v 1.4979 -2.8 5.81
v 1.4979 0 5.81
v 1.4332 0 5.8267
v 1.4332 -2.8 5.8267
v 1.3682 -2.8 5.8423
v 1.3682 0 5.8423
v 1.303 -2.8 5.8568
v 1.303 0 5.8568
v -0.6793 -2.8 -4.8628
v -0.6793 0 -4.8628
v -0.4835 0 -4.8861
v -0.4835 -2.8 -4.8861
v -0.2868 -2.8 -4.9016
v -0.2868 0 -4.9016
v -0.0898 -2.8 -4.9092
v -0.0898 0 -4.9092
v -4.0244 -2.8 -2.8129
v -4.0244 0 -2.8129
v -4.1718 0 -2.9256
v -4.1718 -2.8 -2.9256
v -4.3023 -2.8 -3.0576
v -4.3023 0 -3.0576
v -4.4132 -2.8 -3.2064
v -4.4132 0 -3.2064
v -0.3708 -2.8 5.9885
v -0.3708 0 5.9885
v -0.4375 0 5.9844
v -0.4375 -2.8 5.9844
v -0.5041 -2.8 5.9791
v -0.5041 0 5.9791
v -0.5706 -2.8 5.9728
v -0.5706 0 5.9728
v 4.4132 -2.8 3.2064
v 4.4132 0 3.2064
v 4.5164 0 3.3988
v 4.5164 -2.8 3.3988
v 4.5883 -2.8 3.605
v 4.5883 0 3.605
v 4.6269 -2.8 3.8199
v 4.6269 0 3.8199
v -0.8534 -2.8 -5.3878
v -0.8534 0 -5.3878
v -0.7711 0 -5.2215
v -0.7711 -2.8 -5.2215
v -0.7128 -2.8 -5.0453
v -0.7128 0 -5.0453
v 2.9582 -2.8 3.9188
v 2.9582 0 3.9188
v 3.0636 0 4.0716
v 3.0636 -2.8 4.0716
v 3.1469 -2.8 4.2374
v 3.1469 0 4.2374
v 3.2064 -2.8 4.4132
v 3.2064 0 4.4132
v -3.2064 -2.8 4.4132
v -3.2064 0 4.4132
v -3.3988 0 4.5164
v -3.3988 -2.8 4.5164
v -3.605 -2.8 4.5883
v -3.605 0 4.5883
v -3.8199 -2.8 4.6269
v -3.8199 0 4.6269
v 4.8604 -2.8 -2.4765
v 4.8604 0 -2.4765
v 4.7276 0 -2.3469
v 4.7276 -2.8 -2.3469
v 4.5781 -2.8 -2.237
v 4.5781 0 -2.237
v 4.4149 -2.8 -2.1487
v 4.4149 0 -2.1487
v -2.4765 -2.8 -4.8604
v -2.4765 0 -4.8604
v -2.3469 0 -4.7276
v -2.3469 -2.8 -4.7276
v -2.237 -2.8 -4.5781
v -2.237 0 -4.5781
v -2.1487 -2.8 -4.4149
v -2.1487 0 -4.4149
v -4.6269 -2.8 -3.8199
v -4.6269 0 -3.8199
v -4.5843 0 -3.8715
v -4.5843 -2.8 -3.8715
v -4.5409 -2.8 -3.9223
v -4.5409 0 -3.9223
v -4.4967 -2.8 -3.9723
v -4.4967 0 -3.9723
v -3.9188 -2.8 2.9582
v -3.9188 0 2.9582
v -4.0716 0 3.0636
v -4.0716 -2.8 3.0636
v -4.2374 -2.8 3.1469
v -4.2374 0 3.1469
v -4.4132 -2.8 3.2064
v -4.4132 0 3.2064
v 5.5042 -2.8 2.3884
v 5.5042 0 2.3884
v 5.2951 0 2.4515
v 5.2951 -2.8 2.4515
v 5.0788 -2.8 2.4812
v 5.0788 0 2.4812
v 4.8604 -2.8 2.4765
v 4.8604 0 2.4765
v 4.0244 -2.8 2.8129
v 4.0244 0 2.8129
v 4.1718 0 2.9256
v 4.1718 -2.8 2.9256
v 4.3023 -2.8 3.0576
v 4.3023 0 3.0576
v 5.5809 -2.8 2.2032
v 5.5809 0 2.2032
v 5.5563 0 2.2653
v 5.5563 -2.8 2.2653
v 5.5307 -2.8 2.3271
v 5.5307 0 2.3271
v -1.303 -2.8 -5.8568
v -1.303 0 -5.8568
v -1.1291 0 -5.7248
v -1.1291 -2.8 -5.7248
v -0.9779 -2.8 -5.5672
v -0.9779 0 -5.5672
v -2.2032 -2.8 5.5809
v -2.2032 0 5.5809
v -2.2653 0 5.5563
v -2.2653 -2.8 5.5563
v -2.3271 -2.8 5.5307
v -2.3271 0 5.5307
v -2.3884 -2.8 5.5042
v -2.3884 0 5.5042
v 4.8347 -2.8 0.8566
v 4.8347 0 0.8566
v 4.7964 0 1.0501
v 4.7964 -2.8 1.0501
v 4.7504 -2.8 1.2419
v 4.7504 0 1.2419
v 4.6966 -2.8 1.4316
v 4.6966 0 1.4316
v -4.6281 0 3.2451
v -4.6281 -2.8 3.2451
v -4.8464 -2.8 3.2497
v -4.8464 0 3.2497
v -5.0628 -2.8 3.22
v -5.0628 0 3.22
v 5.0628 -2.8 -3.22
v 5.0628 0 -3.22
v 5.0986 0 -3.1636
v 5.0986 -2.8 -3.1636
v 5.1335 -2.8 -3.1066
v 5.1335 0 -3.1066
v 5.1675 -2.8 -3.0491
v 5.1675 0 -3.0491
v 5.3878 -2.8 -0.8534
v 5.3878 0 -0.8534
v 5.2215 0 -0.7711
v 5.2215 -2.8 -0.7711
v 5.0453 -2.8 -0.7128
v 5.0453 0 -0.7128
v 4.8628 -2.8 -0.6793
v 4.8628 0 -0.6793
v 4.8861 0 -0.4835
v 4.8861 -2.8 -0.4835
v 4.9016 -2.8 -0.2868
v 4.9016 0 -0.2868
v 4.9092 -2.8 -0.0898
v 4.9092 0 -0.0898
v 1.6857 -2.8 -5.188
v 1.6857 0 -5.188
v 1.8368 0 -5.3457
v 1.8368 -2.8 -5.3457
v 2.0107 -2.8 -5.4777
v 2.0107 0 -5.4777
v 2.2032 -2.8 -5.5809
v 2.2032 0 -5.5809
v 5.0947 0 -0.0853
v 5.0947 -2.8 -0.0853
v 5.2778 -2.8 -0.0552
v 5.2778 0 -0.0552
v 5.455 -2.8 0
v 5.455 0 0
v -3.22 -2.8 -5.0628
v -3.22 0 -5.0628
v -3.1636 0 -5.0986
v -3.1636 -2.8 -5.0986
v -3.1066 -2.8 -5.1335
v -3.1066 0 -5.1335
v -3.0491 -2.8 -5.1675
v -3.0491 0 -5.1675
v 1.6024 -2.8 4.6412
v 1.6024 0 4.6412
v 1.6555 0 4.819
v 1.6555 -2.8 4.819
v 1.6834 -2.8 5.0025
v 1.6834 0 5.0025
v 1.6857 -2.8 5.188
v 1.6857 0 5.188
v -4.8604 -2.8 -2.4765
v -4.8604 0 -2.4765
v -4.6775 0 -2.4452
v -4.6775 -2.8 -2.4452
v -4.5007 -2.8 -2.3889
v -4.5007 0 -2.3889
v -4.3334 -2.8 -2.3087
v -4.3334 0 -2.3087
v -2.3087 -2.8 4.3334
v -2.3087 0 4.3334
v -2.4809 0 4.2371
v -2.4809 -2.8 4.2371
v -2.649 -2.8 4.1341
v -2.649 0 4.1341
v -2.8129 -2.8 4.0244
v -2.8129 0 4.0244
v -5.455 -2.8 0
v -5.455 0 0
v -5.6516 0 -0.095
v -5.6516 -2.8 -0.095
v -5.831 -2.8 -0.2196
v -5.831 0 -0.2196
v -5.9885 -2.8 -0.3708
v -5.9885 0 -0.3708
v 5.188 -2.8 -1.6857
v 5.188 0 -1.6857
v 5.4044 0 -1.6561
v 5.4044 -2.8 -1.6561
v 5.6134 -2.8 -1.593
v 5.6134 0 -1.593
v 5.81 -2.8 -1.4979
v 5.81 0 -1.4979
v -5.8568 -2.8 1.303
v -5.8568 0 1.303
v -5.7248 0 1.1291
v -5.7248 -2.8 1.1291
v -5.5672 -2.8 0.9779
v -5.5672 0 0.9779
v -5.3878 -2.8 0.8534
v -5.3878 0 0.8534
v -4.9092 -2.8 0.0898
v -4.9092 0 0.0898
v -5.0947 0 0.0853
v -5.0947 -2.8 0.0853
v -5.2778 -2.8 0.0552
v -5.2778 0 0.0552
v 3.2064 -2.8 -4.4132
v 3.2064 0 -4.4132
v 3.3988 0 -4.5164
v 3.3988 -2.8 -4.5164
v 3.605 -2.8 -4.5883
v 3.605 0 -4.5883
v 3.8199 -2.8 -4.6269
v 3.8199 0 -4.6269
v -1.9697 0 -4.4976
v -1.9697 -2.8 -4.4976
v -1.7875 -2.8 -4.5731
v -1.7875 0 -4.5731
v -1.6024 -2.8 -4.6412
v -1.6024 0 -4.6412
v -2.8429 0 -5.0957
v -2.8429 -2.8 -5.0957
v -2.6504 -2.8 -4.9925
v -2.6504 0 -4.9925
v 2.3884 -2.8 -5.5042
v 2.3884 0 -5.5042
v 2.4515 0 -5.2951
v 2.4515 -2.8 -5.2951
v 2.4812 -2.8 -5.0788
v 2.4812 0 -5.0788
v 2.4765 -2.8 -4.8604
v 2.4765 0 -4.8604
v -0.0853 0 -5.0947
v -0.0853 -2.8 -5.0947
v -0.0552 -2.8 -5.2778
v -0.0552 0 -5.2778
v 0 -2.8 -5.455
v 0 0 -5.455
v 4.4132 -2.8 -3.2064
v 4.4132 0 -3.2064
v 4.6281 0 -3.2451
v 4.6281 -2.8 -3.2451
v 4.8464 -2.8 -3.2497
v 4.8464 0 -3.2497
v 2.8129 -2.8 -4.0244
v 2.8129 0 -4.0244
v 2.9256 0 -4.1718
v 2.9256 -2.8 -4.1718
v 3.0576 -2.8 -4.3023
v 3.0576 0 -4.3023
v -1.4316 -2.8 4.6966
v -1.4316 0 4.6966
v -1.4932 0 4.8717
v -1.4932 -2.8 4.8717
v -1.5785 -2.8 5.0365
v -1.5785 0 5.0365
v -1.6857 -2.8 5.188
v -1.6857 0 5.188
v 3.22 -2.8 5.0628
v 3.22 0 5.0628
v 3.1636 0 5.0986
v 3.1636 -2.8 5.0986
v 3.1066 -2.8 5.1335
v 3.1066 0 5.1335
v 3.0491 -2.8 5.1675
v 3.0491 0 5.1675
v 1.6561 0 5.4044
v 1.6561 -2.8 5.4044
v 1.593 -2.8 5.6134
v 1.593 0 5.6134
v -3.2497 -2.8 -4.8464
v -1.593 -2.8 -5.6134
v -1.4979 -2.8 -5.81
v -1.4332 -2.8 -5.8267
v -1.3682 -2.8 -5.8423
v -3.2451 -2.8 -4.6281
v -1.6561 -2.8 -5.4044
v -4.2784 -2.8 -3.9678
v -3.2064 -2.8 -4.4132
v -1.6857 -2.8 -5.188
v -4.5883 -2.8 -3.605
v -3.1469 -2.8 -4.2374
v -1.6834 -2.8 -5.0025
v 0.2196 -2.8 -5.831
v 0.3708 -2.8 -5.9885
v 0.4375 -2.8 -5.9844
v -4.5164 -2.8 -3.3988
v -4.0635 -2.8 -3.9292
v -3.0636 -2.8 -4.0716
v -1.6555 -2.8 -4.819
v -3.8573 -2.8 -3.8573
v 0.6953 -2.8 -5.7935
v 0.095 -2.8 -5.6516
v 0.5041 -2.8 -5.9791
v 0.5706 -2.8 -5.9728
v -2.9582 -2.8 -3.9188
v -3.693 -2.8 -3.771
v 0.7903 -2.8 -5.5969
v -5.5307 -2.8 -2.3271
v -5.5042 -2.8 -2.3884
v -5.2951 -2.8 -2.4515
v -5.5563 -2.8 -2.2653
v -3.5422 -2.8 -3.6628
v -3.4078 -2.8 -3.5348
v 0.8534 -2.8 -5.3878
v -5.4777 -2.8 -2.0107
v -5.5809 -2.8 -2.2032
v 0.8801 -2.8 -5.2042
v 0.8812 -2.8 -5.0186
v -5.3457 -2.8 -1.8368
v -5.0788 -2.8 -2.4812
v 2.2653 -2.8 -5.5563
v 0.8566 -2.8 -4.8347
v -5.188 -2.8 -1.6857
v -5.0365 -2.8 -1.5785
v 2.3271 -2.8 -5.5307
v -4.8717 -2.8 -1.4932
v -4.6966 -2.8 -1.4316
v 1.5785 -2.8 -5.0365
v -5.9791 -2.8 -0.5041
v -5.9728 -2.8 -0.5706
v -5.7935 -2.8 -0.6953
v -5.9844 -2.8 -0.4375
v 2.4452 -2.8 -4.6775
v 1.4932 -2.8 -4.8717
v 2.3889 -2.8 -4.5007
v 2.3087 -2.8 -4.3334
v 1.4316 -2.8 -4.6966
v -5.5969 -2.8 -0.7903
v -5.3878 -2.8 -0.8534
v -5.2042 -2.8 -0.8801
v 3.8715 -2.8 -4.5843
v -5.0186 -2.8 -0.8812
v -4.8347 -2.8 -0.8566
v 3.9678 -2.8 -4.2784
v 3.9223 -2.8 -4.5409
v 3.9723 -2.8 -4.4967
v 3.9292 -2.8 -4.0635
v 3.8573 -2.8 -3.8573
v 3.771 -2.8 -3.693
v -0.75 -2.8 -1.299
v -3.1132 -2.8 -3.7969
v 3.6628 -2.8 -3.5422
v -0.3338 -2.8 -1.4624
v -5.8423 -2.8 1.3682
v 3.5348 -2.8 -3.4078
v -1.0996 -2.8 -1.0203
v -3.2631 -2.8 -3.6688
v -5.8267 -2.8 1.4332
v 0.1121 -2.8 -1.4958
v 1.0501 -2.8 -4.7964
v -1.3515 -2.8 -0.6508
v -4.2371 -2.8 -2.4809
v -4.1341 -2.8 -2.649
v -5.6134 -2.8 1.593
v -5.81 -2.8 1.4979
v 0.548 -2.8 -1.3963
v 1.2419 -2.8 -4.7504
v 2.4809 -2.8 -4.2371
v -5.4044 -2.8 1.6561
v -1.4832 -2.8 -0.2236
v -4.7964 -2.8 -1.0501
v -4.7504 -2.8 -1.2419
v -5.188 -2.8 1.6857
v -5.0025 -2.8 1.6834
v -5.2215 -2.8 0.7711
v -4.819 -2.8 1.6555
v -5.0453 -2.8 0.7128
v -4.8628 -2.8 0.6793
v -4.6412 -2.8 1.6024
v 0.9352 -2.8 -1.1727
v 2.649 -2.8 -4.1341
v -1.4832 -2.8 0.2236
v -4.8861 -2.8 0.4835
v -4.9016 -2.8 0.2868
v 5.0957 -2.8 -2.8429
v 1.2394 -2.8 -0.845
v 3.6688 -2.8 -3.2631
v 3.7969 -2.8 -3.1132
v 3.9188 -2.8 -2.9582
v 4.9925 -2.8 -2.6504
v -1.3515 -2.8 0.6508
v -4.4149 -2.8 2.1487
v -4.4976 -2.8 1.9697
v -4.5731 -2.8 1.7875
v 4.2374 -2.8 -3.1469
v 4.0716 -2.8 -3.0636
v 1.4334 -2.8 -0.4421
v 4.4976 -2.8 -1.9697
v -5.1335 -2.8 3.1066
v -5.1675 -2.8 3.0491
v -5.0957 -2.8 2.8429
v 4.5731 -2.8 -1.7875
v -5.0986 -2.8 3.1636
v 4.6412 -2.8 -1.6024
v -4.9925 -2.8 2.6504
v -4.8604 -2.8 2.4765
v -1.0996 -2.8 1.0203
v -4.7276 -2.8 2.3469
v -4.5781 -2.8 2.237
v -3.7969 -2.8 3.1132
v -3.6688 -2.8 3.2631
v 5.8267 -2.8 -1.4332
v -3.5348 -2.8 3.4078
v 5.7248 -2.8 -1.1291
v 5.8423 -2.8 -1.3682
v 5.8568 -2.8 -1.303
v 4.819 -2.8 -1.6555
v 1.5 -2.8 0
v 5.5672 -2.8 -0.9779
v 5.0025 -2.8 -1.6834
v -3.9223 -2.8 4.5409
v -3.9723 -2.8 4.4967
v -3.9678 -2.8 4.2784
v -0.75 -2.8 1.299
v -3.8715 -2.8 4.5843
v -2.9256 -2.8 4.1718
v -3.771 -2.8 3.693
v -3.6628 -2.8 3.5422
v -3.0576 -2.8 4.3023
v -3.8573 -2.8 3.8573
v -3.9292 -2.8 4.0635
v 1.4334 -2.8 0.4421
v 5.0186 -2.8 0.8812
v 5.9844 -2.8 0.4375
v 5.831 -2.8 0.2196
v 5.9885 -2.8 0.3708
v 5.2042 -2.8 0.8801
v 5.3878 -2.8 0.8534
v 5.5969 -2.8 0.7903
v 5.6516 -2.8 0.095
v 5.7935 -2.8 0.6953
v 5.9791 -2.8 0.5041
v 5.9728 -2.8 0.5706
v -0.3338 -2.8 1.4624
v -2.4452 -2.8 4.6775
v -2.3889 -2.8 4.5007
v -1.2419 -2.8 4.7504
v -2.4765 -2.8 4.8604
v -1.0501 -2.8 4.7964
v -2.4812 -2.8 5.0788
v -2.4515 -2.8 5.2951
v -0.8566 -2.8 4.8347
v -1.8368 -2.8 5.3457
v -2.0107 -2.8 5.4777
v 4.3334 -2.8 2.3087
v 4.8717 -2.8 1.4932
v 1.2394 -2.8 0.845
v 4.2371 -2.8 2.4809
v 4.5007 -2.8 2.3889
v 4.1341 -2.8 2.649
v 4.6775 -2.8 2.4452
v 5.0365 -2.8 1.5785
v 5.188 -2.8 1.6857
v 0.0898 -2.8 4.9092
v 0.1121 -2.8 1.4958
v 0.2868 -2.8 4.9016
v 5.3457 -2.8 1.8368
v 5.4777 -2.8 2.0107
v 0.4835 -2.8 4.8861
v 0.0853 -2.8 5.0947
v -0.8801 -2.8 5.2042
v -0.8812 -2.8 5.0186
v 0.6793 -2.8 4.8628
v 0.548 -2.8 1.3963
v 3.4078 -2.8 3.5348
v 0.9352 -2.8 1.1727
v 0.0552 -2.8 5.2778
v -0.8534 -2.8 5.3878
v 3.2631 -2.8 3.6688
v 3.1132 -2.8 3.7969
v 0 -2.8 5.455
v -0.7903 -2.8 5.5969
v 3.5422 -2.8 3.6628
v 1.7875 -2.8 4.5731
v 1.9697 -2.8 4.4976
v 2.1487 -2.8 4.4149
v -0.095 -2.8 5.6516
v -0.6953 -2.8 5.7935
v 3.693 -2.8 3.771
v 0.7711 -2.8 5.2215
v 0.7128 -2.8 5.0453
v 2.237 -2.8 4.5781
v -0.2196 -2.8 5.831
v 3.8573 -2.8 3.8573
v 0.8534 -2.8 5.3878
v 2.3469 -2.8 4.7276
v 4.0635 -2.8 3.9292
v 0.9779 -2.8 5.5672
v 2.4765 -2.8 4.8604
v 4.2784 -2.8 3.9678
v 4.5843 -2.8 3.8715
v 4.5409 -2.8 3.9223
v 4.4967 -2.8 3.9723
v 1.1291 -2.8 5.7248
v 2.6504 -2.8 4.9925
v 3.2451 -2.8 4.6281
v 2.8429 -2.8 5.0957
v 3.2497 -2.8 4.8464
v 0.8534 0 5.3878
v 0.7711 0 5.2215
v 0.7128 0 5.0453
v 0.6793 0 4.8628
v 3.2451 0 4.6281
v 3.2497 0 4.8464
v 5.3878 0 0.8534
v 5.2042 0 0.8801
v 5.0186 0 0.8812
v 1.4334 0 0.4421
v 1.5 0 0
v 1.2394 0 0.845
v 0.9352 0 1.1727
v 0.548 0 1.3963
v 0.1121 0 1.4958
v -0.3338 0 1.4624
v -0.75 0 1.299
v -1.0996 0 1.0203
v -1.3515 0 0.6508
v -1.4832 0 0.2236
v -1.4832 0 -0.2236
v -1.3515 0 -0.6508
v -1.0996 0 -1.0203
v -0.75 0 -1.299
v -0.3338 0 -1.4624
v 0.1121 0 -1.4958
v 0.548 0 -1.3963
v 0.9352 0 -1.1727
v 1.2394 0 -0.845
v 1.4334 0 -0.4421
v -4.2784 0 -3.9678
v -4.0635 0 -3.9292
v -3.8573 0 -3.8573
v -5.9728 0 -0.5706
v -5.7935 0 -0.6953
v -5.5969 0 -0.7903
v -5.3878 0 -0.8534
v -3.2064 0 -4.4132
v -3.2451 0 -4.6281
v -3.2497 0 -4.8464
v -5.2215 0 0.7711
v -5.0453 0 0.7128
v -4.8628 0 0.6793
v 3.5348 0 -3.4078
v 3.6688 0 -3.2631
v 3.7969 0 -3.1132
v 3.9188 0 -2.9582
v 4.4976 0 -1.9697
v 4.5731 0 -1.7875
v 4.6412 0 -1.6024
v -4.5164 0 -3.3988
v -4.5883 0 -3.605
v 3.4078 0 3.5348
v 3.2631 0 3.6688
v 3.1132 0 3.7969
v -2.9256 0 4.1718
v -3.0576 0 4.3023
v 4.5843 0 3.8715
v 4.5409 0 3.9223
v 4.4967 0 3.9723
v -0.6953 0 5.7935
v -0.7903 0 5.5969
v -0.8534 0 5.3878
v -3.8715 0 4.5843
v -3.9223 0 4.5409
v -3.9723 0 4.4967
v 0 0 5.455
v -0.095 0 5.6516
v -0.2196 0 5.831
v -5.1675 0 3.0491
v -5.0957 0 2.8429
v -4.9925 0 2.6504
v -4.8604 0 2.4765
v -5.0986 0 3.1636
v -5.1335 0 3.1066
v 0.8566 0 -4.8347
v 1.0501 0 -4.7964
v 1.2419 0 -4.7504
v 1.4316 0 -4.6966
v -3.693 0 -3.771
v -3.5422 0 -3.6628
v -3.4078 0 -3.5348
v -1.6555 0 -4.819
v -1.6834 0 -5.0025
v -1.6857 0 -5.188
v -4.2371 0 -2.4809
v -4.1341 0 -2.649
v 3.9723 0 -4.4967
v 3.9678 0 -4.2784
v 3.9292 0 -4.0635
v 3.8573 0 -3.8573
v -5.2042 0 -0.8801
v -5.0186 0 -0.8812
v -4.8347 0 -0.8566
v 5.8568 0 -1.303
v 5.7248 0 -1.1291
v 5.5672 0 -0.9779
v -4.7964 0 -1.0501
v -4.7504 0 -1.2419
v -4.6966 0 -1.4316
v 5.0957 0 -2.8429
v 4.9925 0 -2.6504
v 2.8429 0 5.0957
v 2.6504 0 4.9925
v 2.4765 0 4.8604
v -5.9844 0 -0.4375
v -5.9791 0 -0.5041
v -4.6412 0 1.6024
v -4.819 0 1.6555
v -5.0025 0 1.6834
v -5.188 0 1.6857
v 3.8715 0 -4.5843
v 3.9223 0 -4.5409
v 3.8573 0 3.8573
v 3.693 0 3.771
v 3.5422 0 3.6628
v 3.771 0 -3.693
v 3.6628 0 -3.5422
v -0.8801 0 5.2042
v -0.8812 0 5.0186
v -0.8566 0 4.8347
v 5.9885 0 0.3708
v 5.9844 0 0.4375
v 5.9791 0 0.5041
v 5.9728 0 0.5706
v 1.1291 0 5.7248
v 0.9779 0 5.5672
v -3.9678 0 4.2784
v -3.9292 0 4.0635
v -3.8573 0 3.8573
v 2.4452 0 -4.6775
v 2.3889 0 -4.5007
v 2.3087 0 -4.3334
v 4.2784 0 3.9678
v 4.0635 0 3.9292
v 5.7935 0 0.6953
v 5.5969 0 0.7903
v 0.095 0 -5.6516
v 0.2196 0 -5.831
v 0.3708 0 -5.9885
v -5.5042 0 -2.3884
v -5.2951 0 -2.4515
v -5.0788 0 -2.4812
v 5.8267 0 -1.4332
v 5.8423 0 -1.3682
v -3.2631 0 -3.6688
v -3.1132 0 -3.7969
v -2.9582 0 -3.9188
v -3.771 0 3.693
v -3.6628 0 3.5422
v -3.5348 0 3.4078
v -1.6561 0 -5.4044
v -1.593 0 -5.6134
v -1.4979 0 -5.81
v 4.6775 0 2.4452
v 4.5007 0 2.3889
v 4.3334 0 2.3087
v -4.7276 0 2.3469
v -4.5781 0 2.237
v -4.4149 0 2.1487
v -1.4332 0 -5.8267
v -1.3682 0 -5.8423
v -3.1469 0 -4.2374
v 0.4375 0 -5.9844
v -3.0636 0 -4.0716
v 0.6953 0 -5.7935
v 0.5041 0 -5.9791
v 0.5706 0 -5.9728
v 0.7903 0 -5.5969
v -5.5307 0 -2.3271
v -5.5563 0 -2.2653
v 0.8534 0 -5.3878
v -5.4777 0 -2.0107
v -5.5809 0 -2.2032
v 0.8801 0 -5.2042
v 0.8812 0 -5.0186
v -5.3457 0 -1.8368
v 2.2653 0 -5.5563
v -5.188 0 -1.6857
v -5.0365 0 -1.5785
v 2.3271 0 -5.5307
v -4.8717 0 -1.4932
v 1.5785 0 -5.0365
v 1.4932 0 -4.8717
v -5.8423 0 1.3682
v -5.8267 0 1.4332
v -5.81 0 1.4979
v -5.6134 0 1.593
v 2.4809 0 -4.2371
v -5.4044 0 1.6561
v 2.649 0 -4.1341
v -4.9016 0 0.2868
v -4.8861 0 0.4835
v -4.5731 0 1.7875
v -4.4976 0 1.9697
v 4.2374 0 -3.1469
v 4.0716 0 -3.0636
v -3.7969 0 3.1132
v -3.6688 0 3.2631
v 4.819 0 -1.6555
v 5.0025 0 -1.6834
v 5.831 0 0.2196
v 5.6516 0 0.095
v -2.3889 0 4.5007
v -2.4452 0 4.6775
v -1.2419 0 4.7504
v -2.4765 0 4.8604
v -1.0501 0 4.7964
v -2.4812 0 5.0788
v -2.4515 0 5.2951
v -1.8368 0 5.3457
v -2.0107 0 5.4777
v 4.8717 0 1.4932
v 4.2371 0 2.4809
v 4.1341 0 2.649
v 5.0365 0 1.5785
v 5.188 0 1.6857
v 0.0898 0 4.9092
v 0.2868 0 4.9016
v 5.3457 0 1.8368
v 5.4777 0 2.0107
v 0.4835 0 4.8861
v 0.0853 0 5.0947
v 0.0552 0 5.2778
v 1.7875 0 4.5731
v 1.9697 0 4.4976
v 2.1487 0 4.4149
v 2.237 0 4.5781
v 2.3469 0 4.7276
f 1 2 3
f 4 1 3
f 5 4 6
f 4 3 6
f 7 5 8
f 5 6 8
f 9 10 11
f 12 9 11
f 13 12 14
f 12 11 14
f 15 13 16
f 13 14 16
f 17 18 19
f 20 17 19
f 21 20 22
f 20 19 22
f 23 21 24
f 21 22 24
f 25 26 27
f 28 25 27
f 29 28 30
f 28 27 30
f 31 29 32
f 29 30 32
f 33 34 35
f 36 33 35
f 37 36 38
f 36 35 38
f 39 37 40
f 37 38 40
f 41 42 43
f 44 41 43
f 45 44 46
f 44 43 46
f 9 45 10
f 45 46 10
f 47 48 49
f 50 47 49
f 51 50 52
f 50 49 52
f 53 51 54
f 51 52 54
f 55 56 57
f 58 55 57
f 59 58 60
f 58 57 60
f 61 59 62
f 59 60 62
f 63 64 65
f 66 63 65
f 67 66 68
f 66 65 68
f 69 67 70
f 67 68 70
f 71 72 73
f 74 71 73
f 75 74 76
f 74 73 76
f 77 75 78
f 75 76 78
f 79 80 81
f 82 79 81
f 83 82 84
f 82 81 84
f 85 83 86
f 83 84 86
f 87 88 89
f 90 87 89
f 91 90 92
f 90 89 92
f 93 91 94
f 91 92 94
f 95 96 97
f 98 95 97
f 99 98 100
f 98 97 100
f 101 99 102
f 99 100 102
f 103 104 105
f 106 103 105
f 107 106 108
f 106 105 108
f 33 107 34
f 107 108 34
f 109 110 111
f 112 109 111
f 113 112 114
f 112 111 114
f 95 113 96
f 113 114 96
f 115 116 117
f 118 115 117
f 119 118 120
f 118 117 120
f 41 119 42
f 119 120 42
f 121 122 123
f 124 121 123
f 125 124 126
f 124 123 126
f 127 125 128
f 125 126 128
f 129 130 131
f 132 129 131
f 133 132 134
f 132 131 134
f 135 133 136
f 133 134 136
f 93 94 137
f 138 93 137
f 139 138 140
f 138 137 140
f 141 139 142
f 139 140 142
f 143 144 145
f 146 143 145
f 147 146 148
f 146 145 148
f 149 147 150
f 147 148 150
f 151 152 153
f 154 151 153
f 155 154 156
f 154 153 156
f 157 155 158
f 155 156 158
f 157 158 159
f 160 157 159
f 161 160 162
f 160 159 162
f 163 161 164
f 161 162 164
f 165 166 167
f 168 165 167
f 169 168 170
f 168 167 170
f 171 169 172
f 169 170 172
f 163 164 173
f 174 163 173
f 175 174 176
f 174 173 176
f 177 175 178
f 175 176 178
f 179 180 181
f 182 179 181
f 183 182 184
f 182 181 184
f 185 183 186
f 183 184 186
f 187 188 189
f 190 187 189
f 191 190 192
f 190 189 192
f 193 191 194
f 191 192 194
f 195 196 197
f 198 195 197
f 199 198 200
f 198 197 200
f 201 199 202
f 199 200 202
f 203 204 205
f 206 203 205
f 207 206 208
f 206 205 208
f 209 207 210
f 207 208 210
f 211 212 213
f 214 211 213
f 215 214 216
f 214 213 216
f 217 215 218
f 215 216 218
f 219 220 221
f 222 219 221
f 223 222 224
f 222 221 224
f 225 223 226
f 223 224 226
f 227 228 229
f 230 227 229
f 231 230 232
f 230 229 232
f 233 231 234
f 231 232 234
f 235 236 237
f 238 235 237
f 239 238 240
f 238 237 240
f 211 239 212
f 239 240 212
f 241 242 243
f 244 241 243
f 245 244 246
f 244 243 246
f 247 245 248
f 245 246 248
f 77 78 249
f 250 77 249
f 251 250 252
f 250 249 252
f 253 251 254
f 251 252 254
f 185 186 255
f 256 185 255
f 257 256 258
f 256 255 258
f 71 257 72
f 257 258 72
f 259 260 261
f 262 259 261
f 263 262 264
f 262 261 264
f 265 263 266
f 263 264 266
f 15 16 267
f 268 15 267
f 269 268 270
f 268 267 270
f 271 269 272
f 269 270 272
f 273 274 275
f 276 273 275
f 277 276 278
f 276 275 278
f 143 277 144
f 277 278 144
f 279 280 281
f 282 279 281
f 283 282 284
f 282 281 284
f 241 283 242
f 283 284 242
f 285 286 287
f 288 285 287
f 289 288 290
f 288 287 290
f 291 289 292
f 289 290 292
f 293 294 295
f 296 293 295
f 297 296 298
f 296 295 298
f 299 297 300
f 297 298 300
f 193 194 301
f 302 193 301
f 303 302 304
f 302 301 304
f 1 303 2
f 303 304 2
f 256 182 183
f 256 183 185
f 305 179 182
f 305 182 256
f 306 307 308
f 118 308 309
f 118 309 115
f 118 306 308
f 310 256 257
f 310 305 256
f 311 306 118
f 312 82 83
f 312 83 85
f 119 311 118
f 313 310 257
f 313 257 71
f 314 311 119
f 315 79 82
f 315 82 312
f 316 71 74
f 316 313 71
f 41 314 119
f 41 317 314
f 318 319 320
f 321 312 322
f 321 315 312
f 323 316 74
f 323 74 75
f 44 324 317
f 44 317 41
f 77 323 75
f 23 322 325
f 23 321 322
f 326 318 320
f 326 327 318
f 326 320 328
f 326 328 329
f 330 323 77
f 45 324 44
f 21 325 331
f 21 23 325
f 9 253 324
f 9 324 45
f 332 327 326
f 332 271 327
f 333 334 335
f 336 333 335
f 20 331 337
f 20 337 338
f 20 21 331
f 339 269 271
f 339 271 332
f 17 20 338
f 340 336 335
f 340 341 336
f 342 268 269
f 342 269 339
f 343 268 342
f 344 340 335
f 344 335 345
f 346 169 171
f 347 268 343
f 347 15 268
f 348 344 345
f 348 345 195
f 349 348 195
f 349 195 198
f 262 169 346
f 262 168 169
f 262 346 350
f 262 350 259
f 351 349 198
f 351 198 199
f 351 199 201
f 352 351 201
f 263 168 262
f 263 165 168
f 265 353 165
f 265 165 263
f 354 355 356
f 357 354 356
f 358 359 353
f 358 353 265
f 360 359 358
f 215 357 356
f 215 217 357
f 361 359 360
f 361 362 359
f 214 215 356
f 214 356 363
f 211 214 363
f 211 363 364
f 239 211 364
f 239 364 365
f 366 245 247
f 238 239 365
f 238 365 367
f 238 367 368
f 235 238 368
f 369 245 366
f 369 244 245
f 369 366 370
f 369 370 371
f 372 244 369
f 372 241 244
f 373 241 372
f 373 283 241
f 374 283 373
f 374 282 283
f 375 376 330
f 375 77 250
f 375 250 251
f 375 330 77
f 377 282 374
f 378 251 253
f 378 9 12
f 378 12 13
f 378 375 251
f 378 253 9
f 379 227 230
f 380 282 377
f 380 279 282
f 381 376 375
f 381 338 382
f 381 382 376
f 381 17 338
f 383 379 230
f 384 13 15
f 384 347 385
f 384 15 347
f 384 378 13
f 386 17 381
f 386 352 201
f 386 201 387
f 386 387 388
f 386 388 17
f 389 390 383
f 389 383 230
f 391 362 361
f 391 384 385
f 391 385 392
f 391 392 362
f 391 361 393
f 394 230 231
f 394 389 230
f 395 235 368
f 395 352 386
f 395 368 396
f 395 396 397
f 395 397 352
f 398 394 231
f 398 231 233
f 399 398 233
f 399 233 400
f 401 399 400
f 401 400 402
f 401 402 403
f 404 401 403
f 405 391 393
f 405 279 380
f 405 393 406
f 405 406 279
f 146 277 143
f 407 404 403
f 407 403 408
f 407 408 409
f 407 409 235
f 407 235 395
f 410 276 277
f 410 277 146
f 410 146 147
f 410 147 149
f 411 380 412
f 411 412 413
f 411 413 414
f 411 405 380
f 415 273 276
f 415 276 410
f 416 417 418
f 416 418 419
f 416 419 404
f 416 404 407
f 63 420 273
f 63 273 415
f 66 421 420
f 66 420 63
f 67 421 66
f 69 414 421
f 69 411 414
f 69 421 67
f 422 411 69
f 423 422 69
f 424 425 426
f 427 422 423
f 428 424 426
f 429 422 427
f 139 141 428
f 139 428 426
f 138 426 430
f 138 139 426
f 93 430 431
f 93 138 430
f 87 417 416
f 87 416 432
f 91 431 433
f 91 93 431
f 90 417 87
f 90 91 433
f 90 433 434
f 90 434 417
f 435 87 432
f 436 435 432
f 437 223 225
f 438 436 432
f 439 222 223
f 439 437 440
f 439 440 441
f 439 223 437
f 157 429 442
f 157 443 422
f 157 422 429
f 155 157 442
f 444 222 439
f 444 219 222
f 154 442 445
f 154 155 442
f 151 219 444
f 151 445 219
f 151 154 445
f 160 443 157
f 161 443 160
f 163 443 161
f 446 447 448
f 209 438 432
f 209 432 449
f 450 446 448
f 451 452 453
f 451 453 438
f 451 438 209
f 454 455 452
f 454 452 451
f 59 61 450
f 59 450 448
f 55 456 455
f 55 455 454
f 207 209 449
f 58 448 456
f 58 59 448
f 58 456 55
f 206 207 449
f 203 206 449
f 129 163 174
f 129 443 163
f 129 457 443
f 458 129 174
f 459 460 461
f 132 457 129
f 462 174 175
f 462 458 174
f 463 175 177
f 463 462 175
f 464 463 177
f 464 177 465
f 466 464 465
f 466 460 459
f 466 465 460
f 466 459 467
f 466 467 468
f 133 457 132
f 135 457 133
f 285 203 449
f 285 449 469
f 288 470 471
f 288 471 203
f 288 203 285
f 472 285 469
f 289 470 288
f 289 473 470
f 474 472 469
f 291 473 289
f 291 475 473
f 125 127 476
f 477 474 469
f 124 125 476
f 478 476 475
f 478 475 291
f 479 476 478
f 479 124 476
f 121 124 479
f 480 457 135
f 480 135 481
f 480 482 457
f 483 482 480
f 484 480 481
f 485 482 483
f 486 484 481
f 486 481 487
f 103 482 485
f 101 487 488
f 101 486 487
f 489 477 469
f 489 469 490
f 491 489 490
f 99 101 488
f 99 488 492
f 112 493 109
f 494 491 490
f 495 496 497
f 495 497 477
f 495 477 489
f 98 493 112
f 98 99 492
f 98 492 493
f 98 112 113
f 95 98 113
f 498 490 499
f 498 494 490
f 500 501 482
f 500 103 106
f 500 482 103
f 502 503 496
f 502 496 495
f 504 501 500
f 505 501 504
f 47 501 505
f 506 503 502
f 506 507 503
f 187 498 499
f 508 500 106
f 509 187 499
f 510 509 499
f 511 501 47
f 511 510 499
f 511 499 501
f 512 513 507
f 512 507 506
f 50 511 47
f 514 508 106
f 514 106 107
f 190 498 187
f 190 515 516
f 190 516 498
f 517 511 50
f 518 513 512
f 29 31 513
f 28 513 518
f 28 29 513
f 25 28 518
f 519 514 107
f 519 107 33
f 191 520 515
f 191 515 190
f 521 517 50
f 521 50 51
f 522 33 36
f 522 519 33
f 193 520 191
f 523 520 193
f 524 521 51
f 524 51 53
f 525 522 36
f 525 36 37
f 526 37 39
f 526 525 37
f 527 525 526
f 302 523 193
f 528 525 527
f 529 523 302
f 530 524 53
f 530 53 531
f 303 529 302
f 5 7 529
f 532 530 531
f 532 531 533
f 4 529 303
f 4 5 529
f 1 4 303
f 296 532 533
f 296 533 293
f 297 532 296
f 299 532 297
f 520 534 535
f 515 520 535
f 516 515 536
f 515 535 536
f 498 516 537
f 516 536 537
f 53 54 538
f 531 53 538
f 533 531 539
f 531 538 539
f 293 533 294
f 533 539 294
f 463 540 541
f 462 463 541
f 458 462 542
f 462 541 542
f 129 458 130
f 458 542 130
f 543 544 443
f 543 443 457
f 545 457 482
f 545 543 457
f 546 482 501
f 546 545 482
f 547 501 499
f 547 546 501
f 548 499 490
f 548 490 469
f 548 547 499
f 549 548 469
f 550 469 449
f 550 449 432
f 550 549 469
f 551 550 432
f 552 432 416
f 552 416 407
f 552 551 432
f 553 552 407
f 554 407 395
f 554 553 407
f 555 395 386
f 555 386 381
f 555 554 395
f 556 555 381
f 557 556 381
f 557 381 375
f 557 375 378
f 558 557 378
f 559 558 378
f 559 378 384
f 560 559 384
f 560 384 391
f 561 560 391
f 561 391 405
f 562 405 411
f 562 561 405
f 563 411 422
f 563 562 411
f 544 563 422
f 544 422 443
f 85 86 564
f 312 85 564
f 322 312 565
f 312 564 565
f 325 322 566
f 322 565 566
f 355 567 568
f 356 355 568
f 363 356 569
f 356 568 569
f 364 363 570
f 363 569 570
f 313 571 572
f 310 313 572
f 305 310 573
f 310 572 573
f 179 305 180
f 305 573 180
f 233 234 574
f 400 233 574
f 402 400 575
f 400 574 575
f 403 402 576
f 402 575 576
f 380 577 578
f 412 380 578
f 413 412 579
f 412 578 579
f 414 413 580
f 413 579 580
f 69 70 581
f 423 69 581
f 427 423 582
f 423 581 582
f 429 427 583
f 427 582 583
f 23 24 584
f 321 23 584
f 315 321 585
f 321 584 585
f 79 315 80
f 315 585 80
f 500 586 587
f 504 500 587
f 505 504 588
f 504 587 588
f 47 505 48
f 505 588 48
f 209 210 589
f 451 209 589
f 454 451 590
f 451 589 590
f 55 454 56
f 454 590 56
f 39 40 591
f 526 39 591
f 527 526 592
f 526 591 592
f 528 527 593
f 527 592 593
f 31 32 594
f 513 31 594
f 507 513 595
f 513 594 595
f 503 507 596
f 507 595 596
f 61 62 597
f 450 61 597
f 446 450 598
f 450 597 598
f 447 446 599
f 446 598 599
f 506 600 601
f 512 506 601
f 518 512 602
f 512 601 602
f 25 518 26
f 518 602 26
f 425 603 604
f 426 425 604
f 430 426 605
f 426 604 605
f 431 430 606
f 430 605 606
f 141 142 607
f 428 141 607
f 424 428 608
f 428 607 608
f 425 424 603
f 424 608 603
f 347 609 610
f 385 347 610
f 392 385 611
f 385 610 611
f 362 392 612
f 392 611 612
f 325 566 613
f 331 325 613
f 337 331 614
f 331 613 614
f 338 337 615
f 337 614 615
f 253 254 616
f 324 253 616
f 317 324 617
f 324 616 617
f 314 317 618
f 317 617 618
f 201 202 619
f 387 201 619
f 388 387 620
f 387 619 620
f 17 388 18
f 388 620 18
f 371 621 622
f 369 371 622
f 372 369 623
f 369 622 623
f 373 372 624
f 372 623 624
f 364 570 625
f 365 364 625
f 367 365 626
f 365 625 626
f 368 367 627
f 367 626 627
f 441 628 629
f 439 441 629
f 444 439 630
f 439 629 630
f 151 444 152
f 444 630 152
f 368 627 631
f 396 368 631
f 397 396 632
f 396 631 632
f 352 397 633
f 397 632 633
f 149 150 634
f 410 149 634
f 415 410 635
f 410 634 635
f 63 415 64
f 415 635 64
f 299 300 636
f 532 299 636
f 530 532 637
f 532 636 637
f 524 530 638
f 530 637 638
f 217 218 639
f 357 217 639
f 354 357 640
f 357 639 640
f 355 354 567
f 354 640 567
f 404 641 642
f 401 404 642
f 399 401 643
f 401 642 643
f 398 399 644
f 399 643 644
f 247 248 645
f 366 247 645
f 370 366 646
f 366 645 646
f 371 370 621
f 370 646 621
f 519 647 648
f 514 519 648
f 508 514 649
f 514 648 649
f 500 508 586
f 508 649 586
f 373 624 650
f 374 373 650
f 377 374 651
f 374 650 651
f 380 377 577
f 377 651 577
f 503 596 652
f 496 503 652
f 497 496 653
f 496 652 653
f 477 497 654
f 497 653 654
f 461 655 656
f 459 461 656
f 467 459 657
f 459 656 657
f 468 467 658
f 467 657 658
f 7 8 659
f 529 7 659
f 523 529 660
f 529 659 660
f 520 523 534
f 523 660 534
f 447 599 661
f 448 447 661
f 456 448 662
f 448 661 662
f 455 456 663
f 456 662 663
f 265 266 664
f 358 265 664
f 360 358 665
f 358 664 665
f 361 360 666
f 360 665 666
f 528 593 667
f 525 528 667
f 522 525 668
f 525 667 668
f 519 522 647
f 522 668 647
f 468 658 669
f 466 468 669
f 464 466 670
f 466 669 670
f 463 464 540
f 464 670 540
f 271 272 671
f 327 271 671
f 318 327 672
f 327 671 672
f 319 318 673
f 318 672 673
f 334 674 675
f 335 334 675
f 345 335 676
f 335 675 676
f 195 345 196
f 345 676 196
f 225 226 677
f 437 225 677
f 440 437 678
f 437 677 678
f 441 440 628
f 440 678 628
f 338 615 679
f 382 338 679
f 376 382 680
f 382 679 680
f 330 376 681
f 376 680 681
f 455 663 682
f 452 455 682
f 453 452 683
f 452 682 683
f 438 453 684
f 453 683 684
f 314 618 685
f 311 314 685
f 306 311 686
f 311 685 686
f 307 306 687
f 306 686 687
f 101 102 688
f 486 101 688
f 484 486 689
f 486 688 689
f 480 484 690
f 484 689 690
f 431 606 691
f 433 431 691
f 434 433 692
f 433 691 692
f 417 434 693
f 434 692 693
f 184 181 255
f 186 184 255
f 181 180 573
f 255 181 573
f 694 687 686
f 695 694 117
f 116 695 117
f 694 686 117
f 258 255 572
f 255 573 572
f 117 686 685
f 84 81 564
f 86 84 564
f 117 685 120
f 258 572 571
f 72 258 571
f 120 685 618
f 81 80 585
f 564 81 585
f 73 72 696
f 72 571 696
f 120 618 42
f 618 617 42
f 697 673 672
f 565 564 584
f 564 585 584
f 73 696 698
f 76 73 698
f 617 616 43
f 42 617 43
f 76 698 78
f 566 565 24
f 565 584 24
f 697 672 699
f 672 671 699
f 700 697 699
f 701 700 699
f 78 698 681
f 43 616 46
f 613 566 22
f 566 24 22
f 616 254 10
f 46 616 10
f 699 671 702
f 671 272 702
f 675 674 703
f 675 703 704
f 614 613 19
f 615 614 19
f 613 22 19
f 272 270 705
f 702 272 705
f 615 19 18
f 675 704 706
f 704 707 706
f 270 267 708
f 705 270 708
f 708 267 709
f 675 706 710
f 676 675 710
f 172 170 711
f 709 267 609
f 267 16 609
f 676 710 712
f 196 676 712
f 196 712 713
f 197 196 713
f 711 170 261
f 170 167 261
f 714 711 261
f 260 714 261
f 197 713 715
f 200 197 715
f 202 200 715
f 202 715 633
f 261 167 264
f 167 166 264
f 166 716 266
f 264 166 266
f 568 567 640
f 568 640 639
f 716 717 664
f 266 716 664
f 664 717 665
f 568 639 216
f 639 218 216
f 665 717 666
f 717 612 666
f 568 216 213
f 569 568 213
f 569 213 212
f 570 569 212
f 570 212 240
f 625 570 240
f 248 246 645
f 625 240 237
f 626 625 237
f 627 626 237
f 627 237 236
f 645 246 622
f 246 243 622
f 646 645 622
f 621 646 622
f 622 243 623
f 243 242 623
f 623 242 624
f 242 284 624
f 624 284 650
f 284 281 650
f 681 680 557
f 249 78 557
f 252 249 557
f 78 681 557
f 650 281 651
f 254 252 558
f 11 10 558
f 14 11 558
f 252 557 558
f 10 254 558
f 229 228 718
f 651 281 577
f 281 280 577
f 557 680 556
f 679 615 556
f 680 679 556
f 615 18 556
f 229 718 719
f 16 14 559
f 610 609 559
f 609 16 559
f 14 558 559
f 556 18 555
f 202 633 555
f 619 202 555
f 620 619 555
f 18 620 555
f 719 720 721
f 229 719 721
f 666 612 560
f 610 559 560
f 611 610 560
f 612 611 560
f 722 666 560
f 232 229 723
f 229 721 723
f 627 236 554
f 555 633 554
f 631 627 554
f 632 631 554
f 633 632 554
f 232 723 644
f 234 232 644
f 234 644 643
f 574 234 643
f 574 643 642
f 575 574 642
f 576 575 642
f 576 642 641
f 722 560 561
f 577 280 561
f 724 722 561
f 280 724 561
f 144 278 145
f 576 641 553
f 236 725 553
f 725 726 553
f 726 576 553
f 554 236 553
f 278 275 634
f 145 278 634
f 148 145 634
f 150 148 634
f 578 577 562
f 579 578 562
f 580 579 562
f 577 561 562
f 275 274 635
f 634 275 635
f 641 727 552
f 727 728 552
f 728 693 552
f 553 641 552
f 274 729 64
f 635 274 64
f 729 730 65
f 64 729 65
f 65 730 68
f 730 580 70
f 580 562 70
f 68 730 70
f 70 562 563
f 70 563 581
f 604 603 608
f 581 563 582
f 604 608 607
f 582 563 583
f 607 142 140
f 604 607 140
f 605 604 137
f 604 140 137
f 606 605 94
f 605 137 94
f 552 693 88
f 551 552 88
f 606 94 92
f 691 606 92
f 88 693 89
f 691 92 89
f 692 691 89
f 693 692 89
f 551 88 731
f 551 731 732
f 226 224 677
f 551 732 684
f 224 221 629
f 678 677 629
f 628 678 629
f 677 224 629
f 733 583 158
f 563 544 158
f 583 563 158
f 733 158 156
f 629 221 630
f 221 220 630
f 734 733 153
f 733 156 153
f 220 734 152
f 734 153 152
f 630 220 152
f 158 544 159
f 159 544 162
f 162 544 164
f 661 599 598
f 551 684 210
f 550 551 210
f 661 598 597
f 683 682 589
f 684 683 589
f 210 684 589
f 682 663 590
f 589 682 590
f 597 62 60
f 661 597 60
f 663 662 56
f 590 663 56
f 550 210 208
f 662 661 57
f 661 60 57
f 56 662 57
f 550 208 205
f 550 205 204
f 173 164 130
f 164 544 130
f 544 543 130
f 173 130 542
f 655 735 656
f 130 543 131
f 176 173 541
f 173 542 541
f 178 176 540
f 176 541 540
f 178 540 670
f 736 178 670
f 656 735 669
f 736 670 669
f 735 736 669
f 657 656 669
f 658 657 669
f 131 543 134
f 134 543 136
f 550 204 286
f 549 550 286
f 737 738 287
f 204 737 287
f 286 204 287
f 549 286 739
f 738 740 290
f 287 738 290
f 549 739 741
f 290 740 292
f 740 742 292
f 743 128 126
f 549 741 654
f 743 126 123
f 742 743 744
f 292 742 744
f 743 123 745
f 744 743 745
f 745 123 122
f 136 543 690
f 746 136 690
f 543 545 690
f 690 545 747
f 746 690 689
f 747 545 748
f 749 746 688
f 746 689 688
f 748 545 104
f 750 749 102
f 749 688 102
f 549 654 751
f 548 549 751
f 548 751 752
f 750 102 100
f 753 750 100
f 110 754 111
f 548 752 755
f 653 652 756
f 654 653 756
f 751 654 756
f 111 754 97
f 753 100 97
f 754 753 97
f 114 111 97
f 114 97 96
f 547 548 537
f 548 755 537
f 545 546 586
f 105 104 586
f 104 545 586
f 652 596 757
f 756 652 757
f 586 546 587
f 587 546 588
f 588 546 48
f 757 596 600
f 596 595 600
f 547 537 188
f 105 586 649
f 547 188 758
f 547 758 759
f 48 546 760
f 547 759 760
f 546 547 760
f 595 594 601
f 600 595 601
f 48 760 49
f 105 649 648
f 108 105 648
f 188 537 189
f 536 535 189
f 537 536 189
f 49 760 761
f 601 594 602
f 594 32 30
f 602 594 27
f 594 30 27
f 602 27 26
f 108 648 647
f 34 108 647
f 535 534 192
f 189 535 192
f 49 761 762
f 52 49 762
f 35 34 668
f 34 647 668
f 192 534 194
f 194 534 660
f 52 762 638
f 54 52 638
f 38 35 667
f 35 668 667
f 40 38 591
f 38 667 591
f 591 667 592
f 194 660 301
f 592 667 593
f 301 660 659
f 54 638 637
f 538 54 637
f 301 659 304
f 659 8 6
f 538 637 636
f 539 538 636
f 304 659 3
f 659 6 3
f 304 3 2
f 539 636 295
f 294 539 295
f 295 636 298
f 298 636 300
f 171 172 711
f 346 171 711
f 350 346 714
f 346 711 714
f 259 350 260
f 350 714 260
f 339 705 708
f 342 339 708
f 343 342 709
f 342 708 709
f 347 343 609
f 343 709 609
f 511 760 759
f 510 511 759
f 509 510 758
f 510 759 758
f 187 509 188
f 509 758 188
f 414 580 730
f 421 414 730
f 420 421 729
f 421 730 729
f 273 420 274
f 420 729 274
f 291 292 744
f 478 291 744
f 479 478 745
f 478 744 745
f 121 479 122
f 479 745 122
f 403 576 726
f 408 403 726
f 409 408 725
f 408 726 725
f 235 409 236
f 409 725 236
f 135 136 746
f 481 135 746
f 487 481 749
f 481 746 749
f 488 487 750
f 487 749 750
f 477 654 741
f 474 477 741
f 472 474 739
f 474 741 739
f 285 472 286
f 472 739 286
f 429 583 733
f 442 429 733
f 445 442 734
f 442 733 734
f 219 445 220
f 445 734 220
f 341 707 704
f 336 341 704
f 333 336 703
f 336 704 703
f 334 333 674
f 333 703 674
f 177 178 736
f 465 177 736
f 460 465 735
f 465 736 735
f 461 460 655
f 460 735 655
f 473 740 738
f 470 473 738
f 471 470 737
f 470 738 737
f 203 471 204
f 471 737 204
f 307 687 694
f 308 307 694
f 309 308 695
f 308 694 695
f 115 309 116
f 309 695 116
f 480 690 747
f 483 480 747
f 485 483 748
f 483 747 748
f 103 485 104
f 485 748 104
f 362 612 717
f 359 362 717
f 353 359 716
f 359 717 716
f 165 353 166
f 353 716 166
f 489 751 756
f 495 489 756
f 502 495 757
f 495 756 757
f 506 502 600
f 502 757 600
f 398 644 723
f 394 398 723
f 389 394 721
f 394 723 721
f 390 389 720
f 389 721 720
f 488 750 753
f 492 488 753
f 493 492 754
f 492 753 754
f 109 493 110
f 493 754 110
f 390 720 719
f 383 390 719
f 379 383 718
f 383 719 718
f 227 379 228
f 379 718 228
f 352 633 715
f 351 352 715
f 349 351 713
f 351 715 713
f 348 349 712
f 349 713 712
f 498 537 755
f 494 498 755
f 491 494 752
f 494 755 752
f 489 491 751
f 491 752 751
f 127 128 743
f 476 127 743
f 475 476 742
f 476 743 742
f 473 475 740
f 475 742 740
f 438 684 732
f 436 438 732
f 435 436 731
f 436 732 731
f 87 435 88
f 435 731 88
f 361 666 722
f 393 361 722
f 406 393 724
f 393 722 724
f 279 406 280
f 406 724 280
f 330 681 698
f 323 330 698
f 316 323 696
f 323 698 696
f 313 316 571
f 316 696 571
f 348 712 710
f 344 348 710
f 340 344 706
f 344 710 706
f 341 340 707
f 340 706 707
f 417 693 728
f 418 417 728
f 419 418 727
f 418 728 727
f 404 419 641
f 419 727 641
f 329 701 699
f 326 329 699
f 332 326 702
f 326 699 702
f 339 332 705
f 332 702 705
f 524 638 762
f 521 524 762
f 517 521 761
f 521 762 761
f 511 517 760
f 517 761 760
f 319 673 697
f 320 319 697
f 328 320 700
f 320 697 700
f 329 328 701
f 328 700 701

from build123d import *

# Parameters (mm, degrees)
F1_DEPTH = 2.8
F2_COUNT = 20
F2_ANGLE = 342
F3_R     = 1.5
F4_DEPTH = 2.8


with BuildPart() as f1:
    # F0 (on Front) → F1 (new body)
    with BuildSketch(Plane.XZ):
        with BuildLine():
            ThreePointArc((-0.856629721, 4.8346960112), (-0.38523416, 4.8948641086), (0.0897701035, 4.9091792928))
            ThreePointArc((0.0897701035, 4.9091792928), (0.0734017823, 5.1867797393), (0, 5.455))
            ThreePointArc((0, 5.455), (-0.1537545483, 5.7437546233), (-0.3707884455, 5.9885320345))
            ThreePointArc((-0.3707884455, 5.9885320345), (-0.4707851627, 5.9818926646), (-0.5705893808, 5.9728073599))
            ThreePointArc((-0.5705893808, 5.9728073599), (-0.7466596071, 5.6970919831), (-0.8533500068, 5.3878398979))
            ThreePointArc((-0.8533500068, 5.3878398979), (-0.8838891984, 5.1114393052), (-0.856629721, 4.8346960112))
        make_face()
        with BuildLine():
            ThreePointArc((-0.856629721, 4.8346960112), (-3.1545243754, -3.7625889976), (4.91, 0))
            ThreePointArc((4.91, 0), (3.5034890615, 3.4400093599), (0.0897701035, 4.9091792928))
            ThreePointArc((0.0897701035, 4.9091792928), (-0.38523416, 4.8948641086), (-0.856629721, 4.8346960112))
        make_face()
    extrude(amount=F1_DEPTH)

    # F2: F1 ×20 about axis
    f2_axis = Axis((0, 0, 0), (0, 1, 0))


with BuildPart() as f1_1:
    add(f1.part)
    for i in range(1, F2_COUNT):
        add(f1.part.rotate(f2_axis, i * F2_ANGLE / (F2_COUNT - 1)))

    # F3 (on face) → F4 (cut)
    with BuildSketch(Plane.XZ):
        Circle(F3_R)
    extrude(amount=F4_DEPTH, mode=Mode.SUBTRACT)


solid = f1_1.part
